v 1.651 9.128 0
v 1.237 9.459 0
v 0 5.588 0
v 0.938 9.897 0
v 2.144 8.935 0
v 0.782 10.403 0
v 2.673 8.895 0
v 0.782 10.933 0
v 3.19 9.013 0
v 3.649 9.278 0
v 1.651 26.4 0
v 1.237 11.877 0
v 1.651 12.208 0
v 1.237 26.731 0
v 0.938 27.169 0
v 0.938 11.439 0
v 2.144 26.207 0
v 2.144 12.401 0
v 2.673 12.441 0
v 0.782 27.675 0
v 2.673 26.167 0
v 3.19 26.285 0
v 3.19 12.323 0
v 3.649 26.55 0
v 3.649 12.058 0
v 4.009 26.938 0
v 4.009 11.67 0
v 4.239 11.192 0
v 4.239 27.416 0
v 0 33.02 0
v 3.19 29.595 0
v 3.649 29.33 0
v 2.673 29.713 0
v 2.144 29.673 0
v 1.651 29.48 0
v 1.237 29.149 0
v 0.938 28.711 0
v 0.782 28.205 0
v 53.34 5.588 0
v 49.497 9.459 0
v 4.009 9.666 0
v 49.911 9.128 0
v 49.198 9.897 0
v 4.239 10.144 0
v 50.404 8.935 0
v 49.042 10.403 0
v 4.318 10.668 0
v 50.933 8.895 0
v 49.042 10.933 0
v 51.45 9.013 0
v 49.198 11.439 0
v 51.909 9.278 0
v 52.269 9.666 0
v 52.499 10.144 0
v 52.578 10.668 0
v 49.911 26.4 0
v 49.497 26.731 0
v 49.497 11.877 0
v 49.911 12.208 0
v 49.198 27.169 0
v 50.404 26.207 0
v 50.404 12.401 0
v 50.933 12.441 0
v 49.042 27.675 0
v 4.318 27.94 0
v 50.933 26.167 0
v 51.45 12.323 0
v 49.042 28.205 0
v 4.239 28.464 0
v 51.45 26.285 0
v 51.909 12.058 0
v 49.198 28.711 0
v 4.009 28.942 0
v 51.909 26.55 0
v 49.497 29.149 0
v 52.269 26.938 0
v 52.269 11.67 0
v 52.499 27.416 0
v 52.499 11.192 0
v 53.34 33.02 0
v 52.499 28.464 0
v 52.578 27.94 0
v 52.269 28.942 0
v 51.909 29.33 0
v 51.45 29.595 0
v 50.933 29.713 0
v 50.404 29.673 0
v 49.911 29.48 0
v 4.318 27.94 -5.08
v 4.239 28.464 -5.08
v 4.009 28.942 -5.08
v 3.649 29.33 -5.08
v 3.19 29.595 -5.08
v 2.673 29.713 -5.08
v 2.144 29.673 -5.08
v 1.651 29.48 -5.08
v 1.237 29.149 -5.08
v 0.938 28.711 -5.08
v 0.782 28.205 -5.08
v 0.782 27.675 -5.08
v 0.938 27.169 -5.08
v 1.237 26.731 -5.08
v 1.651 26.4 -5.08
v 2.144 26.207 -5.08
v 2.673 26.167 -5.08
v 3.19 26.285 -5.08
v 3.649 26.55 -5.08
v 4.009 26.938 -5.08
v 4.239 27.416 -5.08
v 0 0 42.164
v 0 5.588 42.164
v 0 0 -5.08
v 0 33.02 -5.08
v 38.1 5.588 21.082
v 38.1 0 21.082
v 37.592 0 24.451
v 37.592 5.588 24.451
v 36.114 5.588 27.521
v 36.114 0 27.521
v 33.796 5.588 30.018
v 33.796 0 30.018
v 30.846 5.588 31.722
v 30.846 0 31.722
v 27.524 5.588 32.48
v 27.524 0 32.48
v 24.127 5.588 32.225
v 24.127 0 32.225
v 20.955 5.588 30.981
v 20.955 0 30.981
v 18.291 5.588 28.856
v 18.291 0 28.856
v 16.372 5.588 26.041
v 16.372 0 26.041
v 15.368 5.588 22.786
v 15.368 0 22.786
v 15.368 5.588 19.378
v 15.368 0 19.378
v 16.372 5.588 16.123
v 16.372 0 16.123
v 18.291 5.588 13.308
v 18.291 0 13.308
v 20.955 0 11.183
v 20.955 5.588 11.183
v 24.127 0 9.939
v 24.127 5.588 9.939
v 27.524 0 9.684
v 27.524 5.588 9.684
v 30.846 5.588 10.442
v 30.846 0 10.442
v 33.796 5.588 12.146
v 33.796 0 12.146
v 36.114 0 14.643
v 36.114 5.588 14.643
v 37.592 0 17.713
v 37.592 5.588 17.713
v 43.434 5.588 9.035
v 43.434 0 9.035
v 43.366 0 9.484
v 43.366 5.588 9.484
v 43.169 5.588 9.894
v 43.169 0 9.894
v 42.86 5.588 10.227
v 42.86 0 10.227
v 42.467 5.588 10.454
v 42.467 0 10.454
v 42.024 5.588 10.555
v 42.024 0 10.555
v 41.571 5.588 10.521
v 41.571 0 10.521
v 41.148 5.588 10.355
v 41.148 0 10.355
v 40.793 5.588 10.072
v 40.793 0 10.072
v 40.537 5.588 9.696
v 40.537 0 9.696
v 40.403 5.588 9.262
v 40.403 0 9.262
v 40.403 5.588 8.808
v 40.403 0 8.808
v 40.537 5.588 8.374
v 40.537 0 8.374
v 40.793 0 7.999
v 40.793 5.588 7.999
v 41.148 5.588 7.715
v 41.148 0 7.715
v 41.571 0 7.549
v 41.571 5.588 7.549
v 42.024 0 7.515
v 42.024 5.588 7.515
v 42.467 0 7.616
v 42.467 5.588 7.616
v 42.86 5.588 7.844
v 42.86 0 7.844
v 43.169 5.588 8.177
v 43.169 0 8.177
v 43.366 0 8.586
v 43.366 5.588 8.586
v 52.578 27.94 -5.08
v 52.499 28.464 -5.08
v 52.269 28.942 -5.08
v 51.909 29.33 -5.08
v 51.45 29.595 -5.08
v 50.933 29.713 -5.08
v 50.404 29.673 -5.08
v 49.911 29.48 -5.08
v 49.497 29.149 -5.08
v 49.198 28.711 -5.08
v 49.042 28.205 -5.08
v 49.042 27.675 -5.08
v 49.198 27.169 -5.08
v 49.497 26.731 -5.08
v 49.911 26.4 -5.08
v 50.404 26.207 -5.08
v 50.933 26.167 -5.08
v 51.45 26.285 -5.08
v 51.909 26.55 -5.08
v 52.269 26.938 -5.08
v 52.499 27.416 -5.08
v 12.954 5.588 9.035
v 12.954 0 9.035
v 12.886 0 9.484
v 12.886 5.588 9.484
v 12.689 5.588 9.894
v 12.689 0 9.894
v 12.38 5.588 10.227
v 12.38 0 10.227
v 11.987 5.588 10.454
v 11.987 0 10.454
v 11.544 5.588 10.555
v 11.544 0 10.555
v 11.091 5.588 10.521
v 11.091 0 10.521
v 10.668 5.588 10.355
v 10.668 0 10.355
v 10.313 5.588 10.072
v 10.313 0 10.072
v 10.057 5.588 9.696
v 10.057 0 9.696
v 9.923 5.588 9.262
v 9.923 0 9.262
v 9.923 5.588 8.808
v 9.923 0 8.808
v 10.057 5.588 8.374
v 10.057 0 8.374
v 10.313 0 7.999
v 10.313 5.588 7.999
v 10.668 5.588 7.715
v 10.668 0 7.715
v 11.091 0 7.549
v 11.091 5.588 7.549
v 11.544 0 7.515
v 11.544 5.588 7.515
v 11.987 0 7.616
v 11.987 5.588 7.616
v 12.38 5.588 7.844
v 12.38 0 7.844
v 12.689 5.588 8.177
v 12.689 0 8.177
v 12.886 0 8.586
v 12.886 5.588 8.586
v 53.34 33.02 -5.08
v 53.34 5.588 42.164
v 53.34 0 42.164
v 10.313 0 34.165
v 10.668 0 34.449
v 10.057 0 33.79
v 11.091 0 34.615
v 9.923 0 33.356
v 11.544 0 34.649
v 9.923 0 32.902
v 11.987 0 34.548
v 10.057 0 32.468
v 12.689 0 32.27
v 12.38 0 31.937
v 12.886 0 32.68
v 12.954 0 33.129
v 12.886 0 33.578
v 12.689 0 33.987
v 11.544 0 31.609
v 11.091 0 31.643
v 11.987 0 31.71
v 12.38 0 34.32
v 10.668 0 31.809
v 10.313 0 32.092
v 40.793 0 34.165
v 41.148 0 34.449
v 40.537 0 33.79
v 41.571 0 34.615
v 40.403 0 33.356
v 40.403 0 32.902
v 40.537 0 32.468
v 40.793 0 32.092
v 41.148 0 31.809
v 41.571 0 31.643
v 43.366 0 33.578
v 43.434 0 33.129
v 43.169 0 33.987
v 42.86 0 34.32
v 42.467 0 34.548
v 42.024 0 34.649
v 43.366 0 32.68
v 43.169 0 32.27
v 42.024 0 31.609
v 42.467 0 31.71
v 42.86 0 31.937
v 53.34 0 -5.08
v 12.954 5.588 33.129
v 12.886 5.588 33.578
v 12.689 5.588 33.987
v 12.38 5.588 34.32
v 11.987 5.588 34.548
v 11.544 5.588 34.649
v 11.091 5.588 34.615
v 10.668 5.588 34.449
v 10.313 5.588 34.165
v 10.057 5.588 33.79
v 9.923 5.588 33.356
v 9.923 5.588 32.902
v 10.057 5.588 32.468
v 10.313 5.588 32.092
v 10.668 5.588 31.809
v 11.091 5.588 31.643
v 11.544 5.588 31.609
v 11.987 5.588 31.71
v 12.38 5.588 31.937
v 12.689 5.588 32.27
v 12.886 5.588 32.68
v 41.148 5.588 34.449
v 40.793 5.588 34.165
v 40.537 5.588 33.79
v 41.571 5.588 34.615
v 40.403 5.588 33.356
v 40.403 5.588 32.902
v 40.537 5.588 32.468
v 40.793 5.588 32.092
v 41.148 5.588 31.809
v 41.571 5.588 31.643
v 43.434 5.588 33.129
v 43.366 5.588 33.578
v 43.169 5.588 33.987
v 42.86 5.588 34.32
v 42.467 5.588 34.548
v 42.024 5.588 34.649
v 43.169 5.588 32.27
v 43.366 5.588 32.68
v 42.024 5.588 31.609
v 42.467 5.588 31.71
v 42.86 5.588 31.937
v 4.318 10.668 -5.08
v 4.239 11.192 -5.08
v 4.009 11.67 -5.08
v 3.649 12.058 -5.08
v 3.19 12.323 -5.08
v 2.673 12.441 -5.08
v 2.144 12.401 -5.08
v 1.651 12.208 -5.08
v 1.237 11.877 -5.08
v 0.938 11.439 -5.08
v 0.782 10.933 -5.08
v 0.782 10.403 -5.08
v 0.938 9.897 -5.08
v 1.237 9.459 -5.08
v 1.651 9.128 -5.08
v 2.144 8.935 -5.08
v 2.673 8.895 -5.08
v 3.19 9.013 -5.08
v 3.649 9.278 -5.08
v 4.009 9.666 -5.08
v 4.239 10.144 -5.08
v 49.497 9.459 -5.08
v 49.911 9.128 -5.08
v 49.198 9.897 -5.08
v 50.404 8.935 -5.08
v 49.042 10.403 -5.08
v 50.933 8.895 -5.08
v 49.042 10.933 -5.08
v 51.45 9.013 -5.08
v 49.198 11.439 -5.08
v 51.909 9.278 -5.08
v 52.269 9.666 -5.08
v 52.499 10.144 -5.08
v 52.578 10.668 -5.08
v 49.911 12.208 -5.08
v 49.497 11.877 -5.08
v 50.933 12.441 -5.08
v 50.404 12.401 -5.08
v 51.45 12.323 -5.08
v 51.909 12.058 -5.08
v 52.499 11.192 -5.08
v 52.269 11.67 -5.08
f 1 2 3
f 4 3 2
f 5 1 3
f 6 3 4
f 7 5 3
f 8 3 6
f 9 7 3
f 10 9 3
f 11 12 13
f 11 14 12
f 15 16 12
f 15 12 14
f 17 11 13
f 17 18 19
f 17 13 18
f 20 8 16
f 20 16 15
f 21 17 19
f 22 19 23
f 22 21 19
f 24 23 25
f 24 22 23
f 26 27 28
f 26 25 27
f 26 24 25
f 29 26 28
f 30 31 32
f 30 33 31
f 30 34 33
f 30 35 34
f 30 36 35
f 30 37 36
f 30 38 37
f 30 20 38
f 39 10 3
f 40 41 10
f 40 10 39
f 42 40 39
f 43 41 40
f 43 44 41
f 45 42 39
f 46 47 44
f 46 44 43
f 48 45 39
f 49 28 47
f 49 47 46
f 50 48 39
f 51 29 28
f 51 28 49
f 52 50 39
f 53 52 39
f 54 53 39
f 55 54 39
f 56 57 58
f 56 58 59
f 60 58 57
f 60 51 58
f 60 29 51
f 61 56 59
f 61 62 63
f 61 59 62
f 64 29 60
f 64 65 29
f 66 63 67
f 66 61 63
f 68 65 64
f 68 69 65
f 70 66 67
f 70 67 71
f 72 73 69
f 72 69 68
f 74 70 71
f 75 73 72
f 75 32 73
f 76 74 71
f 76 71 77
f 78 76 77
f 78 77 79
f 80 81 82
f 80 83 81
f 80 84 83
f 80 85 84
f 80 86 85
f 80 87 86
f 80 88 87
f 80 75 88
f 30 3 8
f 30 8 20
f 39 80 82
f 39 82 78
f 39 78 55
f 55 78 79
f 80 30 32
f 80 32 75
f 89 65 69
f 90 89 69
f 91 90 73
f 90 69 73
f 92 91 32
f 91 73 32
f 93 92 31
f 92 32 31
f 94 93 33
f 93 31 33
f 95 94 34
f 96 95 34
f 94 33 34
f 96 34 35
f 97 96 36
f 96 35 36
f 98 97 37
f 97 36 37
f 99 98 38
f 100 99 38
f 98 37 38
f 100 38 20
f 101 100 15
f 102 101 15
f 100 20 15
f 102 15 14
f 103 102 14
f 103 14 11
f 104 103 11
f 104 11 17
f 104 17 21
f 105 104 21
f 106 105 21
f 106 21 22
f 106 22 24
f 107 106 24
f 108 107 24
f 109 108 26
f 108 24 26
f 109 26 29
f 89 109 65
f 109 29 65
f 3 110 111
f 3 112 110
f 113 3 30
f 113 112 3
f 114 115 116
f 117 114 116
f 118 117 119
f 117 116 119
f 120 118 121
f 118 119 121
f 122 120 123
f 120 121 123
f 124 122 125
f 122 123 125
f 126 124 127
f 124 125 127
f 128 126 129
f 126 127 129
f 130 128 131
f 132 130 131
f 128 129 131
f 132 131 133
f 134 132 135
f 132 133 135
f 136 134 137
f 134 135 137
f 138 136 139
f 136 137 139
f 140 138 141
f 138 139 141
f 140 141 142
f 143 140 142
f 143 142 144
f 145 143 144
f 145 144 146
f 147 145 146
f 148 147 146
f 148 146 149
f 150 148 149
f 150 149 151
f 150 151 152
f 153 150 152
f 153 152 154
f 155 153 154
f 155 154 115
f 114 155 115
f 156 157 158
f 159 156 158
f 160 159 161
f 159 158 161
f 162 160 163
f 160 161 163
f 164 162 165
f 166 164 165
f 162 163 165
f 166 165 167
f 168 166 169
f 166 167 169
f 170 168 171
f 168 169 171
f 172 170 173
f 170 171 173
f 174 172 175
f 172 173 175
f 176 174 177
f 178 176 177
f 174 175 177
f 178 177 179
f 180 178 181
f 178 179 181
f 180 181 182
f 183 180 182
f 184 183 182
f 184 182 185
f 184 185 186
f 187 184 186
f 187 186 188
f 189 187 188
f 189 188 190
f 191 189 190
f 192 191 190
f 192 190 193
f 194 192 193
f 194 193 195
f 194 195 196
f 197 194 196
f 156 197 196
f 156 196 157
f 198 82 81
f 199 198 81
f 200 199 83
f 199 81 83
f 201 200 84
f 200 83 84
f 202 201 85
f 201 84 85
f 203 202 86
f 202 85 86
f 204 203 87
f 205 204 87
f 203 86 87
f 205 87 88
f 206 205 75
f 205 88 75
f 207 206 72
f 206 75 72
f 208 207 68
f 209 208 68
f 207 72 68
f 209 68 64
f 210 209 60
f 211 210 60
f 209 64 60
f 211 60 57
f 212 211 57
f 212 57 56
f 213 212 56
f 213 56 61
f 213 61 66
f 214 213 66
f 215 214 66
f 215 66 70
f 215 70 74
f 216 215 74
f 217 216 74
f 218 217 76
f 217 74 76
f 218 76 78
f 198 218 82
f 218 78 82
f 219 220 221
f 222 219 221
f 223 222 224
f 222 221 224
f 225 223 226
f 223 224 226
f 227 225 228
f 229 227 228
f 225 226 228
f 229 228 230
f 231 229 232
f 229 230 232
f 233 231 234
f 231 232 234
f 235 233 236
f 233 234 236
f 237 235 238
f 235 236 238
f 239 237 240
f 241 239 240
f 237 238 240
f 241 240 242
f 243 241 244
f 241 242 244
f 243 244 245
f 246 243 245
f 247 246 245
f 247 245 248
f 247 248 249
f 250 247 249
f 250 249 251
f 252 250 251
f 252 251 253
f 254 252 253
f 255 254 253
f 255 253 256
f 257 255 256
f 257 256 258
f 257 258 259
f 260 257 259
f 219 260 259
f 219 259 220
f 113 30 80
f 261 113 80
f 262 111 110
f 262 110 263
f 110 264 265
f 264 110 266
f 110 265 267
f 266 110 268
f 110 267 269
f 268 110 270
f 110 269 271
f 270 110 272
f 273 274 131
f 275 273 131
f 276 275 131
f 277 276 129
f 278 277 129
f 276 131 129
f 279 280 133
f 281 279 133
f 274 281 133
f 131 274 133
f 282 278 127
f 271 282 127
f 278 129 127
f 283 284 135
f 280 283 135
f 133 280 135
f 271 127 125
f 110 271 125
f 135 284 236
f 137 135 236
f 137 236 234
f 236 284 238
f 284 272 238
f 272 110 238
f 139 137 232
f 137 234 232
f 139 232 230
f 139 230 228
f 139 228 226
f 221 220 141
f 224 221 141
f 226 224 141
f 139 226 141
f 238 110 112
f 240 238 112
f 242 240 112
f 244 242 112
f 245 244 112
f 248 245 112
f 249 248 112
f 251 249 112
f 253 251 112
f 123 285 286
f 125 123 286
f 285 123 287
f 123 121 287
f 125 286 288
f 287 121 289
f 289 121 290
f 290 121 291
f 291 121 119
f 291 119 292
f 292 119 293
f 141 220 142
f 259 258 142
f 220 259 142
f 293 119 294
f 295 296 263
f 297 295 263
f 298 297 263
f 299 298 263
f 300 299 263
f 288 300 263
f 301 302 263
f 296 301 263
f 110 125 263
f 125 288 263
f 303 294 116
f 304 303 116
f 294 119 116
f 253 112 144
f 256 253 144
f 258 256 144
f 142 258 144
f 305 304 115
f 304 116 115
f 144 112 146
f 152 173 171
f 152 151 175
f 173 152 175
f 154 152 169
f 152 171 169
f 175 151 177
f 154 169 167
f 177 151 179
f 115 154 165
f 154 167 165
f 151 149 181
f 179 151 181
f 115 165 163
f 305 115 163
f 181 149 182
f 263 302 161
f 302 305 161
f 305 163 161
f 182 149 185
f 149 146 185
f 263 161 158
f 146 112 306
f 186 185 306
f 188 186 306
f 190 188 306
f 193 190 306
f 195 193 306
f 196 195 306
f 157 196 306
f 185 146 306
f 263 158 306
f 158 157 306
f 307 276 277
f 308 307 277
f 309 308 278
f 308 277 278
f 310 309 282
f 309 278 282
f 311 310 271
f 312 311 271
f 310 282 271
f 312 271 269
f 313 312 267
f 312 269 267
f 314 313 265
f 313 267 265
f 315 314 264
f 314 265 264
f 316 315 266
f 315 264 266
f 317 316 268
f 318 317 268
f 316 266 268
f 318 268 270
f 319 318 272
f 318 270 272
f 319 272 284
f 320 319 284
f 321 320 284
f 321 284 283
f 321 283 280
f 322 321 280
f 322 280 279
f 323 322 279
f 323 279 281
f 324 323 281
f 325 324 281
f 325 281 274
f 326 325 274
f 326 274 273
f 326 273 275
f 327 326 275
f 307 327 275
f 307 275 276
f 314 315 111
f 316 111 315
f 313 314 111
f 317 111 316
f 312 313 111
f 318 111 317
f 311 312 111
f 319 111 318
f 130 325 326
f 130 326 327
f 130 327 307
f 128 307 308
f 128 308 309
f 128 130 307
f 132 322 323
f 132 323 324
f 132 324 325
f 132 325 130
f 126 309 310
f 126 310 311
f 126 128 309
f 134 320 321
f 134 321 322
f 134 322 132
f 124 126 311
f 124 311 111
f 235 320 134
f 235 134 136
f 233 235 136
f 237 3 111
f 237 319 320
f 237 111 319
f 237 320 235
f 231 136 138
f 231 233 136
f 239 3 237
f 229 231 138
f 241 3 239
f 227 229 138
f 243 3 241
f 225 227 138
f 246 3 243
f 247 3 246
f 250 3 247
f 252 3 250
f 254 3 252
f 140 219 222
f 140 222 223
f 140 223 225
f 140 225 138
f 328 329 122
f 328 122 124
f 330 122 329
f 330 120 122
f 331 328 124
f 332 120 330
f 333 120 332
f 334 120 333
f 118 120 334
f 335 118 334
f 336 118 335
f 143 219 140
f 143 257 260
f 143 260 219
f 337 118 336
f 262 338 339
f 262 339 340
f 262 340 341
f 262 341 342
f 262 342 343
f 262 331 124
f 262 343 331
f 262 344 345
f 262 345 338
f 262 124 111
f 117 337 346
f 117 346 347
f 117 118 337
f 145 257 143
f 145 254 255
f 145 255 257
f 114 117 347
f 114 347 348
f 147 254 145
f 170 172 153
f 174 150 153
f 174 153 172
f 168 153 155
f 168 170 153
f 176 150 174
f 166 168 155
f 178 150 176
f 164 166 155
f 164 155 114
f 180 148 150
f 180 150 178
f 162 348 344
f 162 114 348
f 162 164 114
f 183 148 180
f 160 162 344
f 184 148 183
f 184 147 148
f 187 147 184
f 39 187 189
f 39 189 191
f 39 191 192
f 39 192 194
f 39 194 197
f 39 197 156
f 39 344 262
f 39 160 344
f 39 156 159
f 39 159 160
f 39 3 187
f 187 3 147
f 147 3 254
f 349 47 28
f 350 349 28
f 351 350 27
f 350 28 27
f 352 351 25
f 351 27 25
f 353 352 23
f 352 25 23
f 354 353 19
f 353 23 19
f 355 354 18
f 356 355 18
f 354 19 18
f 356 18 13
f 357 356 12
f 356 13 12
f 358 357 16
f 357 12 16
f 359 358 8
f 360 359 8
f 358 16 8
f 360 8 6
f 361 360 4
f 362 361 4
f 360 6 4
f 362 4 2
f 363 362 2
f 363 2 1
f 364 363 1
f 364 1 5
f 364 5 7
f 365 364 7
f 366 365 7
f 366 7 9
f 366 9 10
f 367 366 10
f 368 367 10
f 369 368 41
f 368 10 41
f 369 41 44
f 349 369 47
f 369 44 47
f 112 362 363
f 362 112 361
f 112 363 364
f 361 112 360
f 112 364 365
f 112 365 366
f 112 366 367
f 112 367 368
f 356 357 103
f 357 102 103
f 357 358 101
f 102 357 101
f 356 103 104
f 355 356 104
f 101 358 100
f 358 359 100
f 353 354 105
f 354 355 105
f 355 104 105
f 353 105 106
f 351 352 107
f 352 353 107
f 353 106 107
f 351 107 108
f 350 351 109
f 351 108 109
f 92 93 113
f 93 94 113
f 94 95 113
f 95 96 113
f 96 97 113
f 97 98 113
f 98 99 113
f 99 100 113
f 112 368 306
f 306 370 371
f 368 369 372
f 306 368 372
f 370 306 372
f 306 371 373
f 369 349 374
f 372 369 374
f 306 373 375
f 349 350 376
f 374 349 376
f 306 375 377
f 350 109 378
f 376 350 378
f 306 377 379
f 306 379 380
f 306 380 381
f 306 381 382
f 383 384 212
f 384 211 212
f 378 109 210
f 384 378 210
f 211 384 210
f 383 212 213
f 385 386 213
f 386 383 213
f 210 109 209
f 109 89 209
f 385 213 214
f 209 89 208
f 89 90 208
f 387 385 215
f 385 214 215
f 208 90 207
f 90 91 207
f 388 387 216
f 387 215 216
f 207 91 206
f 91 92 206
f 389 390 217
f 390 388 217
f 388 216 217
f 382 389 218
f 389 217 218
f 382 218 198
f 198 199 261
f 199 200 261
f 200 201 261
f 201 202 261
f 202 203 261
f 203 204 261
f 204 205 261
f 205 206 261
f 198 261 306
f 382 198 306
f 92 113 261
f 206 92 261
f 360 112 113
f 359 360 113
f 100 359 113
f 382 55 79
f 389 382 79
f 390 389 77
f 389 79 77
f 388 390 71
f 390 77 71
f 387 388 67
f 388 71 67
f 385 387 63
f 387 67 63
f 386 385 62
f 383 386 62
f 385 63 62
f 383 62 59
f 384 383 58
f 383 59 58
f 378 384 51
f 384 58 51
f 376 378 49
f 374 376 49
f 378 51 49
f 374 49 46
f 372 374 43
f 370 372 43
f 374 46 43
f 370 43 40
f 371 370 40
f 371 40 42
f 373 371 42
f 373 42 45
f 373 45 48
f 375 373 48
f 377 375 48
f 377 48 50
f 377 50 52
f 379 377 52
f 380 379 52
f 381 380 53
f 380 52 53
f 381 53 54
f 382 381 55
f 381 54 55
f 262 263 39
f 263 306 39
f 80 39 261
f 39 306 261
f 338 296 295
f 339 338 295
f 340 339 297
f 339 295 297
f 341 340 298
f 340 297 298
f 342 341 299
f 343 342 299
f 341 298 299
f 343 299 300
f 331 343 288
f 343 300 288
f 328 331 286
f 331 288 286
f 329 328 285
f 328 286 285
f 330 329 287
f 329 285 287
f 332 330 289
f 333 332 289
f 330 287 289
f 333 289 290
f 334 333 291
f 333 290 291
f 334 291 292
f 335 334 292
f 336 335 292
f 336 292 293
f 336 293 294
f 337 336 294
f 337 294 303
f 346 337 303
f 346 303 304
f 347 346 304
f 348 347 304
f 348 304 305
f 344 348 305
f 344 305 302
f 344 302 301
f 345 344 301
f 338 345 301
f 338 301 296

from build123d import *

# Parameters (mm, degrees)
F0_W     = 53.34
F0_H     = 5.588
F0_H_2   = 27.432
F0_R     = 1.778
F1_DEPTH = 5.08
F2_DEPTH = 42.164
F3_R     = 1.524
F3_R_2   = 11.43
F4_DEPTH = 25.4


with BuildPart() as f1:
    # F0 (on Top) → F1 (new body)
    with BuildSketch(Plane.XY):
        with Locations((26.67, 2.794)):
            Rectangle(F0_W, F0_H)
        with Locations((26.67, 19.304)):
            Rectangle(F0_W, F0_H_2)
        with Locations((2.54, 10.668)):
            Circle(F0_R, mode=Mode.SUBTRACT)
        with Locations((50.8, 10.668)):
            Circle(F0_R, mode=Mode.SUBTRACT)
        with Locations((2.54, 27.94)):
            Circle(F0_R, mode=Mode.SUBTRACT)
        with Locations((50.8, 27.94)):
            Circle(F0_R, mode=Mode.SUBTRACT)
    extrude(amount=-F1_DEPTH)

    # F0 (on Top) → F2 (join)
    with BuildSketch(Plane.XY):
        with Locations((26.67, 2.794)):
            Rectangle(F0_W, F0_H)
    extrude(amount=F2_DEPTH)

    # F3 (on face) → F4 (cut)
    with BuildSketch(Plane.XZ):
        with Locations((11.43, 33.128857)):
            Circle(F3_R)
        with Locations((41.91, 33.128857)):
            Circle(F3_R)
        with Locations((11.43, 9.035143)):
            Circle(F3_R)
        with Locations((41.91, 9.035143)):
            Circle(F3_R)
        with Locations((26.67, 21.082)):
            Circle(F3_R_2)
    extrude(amount=-F4_DEPTH, mode=Mode.SUBTRACT)


solid = f1.part
